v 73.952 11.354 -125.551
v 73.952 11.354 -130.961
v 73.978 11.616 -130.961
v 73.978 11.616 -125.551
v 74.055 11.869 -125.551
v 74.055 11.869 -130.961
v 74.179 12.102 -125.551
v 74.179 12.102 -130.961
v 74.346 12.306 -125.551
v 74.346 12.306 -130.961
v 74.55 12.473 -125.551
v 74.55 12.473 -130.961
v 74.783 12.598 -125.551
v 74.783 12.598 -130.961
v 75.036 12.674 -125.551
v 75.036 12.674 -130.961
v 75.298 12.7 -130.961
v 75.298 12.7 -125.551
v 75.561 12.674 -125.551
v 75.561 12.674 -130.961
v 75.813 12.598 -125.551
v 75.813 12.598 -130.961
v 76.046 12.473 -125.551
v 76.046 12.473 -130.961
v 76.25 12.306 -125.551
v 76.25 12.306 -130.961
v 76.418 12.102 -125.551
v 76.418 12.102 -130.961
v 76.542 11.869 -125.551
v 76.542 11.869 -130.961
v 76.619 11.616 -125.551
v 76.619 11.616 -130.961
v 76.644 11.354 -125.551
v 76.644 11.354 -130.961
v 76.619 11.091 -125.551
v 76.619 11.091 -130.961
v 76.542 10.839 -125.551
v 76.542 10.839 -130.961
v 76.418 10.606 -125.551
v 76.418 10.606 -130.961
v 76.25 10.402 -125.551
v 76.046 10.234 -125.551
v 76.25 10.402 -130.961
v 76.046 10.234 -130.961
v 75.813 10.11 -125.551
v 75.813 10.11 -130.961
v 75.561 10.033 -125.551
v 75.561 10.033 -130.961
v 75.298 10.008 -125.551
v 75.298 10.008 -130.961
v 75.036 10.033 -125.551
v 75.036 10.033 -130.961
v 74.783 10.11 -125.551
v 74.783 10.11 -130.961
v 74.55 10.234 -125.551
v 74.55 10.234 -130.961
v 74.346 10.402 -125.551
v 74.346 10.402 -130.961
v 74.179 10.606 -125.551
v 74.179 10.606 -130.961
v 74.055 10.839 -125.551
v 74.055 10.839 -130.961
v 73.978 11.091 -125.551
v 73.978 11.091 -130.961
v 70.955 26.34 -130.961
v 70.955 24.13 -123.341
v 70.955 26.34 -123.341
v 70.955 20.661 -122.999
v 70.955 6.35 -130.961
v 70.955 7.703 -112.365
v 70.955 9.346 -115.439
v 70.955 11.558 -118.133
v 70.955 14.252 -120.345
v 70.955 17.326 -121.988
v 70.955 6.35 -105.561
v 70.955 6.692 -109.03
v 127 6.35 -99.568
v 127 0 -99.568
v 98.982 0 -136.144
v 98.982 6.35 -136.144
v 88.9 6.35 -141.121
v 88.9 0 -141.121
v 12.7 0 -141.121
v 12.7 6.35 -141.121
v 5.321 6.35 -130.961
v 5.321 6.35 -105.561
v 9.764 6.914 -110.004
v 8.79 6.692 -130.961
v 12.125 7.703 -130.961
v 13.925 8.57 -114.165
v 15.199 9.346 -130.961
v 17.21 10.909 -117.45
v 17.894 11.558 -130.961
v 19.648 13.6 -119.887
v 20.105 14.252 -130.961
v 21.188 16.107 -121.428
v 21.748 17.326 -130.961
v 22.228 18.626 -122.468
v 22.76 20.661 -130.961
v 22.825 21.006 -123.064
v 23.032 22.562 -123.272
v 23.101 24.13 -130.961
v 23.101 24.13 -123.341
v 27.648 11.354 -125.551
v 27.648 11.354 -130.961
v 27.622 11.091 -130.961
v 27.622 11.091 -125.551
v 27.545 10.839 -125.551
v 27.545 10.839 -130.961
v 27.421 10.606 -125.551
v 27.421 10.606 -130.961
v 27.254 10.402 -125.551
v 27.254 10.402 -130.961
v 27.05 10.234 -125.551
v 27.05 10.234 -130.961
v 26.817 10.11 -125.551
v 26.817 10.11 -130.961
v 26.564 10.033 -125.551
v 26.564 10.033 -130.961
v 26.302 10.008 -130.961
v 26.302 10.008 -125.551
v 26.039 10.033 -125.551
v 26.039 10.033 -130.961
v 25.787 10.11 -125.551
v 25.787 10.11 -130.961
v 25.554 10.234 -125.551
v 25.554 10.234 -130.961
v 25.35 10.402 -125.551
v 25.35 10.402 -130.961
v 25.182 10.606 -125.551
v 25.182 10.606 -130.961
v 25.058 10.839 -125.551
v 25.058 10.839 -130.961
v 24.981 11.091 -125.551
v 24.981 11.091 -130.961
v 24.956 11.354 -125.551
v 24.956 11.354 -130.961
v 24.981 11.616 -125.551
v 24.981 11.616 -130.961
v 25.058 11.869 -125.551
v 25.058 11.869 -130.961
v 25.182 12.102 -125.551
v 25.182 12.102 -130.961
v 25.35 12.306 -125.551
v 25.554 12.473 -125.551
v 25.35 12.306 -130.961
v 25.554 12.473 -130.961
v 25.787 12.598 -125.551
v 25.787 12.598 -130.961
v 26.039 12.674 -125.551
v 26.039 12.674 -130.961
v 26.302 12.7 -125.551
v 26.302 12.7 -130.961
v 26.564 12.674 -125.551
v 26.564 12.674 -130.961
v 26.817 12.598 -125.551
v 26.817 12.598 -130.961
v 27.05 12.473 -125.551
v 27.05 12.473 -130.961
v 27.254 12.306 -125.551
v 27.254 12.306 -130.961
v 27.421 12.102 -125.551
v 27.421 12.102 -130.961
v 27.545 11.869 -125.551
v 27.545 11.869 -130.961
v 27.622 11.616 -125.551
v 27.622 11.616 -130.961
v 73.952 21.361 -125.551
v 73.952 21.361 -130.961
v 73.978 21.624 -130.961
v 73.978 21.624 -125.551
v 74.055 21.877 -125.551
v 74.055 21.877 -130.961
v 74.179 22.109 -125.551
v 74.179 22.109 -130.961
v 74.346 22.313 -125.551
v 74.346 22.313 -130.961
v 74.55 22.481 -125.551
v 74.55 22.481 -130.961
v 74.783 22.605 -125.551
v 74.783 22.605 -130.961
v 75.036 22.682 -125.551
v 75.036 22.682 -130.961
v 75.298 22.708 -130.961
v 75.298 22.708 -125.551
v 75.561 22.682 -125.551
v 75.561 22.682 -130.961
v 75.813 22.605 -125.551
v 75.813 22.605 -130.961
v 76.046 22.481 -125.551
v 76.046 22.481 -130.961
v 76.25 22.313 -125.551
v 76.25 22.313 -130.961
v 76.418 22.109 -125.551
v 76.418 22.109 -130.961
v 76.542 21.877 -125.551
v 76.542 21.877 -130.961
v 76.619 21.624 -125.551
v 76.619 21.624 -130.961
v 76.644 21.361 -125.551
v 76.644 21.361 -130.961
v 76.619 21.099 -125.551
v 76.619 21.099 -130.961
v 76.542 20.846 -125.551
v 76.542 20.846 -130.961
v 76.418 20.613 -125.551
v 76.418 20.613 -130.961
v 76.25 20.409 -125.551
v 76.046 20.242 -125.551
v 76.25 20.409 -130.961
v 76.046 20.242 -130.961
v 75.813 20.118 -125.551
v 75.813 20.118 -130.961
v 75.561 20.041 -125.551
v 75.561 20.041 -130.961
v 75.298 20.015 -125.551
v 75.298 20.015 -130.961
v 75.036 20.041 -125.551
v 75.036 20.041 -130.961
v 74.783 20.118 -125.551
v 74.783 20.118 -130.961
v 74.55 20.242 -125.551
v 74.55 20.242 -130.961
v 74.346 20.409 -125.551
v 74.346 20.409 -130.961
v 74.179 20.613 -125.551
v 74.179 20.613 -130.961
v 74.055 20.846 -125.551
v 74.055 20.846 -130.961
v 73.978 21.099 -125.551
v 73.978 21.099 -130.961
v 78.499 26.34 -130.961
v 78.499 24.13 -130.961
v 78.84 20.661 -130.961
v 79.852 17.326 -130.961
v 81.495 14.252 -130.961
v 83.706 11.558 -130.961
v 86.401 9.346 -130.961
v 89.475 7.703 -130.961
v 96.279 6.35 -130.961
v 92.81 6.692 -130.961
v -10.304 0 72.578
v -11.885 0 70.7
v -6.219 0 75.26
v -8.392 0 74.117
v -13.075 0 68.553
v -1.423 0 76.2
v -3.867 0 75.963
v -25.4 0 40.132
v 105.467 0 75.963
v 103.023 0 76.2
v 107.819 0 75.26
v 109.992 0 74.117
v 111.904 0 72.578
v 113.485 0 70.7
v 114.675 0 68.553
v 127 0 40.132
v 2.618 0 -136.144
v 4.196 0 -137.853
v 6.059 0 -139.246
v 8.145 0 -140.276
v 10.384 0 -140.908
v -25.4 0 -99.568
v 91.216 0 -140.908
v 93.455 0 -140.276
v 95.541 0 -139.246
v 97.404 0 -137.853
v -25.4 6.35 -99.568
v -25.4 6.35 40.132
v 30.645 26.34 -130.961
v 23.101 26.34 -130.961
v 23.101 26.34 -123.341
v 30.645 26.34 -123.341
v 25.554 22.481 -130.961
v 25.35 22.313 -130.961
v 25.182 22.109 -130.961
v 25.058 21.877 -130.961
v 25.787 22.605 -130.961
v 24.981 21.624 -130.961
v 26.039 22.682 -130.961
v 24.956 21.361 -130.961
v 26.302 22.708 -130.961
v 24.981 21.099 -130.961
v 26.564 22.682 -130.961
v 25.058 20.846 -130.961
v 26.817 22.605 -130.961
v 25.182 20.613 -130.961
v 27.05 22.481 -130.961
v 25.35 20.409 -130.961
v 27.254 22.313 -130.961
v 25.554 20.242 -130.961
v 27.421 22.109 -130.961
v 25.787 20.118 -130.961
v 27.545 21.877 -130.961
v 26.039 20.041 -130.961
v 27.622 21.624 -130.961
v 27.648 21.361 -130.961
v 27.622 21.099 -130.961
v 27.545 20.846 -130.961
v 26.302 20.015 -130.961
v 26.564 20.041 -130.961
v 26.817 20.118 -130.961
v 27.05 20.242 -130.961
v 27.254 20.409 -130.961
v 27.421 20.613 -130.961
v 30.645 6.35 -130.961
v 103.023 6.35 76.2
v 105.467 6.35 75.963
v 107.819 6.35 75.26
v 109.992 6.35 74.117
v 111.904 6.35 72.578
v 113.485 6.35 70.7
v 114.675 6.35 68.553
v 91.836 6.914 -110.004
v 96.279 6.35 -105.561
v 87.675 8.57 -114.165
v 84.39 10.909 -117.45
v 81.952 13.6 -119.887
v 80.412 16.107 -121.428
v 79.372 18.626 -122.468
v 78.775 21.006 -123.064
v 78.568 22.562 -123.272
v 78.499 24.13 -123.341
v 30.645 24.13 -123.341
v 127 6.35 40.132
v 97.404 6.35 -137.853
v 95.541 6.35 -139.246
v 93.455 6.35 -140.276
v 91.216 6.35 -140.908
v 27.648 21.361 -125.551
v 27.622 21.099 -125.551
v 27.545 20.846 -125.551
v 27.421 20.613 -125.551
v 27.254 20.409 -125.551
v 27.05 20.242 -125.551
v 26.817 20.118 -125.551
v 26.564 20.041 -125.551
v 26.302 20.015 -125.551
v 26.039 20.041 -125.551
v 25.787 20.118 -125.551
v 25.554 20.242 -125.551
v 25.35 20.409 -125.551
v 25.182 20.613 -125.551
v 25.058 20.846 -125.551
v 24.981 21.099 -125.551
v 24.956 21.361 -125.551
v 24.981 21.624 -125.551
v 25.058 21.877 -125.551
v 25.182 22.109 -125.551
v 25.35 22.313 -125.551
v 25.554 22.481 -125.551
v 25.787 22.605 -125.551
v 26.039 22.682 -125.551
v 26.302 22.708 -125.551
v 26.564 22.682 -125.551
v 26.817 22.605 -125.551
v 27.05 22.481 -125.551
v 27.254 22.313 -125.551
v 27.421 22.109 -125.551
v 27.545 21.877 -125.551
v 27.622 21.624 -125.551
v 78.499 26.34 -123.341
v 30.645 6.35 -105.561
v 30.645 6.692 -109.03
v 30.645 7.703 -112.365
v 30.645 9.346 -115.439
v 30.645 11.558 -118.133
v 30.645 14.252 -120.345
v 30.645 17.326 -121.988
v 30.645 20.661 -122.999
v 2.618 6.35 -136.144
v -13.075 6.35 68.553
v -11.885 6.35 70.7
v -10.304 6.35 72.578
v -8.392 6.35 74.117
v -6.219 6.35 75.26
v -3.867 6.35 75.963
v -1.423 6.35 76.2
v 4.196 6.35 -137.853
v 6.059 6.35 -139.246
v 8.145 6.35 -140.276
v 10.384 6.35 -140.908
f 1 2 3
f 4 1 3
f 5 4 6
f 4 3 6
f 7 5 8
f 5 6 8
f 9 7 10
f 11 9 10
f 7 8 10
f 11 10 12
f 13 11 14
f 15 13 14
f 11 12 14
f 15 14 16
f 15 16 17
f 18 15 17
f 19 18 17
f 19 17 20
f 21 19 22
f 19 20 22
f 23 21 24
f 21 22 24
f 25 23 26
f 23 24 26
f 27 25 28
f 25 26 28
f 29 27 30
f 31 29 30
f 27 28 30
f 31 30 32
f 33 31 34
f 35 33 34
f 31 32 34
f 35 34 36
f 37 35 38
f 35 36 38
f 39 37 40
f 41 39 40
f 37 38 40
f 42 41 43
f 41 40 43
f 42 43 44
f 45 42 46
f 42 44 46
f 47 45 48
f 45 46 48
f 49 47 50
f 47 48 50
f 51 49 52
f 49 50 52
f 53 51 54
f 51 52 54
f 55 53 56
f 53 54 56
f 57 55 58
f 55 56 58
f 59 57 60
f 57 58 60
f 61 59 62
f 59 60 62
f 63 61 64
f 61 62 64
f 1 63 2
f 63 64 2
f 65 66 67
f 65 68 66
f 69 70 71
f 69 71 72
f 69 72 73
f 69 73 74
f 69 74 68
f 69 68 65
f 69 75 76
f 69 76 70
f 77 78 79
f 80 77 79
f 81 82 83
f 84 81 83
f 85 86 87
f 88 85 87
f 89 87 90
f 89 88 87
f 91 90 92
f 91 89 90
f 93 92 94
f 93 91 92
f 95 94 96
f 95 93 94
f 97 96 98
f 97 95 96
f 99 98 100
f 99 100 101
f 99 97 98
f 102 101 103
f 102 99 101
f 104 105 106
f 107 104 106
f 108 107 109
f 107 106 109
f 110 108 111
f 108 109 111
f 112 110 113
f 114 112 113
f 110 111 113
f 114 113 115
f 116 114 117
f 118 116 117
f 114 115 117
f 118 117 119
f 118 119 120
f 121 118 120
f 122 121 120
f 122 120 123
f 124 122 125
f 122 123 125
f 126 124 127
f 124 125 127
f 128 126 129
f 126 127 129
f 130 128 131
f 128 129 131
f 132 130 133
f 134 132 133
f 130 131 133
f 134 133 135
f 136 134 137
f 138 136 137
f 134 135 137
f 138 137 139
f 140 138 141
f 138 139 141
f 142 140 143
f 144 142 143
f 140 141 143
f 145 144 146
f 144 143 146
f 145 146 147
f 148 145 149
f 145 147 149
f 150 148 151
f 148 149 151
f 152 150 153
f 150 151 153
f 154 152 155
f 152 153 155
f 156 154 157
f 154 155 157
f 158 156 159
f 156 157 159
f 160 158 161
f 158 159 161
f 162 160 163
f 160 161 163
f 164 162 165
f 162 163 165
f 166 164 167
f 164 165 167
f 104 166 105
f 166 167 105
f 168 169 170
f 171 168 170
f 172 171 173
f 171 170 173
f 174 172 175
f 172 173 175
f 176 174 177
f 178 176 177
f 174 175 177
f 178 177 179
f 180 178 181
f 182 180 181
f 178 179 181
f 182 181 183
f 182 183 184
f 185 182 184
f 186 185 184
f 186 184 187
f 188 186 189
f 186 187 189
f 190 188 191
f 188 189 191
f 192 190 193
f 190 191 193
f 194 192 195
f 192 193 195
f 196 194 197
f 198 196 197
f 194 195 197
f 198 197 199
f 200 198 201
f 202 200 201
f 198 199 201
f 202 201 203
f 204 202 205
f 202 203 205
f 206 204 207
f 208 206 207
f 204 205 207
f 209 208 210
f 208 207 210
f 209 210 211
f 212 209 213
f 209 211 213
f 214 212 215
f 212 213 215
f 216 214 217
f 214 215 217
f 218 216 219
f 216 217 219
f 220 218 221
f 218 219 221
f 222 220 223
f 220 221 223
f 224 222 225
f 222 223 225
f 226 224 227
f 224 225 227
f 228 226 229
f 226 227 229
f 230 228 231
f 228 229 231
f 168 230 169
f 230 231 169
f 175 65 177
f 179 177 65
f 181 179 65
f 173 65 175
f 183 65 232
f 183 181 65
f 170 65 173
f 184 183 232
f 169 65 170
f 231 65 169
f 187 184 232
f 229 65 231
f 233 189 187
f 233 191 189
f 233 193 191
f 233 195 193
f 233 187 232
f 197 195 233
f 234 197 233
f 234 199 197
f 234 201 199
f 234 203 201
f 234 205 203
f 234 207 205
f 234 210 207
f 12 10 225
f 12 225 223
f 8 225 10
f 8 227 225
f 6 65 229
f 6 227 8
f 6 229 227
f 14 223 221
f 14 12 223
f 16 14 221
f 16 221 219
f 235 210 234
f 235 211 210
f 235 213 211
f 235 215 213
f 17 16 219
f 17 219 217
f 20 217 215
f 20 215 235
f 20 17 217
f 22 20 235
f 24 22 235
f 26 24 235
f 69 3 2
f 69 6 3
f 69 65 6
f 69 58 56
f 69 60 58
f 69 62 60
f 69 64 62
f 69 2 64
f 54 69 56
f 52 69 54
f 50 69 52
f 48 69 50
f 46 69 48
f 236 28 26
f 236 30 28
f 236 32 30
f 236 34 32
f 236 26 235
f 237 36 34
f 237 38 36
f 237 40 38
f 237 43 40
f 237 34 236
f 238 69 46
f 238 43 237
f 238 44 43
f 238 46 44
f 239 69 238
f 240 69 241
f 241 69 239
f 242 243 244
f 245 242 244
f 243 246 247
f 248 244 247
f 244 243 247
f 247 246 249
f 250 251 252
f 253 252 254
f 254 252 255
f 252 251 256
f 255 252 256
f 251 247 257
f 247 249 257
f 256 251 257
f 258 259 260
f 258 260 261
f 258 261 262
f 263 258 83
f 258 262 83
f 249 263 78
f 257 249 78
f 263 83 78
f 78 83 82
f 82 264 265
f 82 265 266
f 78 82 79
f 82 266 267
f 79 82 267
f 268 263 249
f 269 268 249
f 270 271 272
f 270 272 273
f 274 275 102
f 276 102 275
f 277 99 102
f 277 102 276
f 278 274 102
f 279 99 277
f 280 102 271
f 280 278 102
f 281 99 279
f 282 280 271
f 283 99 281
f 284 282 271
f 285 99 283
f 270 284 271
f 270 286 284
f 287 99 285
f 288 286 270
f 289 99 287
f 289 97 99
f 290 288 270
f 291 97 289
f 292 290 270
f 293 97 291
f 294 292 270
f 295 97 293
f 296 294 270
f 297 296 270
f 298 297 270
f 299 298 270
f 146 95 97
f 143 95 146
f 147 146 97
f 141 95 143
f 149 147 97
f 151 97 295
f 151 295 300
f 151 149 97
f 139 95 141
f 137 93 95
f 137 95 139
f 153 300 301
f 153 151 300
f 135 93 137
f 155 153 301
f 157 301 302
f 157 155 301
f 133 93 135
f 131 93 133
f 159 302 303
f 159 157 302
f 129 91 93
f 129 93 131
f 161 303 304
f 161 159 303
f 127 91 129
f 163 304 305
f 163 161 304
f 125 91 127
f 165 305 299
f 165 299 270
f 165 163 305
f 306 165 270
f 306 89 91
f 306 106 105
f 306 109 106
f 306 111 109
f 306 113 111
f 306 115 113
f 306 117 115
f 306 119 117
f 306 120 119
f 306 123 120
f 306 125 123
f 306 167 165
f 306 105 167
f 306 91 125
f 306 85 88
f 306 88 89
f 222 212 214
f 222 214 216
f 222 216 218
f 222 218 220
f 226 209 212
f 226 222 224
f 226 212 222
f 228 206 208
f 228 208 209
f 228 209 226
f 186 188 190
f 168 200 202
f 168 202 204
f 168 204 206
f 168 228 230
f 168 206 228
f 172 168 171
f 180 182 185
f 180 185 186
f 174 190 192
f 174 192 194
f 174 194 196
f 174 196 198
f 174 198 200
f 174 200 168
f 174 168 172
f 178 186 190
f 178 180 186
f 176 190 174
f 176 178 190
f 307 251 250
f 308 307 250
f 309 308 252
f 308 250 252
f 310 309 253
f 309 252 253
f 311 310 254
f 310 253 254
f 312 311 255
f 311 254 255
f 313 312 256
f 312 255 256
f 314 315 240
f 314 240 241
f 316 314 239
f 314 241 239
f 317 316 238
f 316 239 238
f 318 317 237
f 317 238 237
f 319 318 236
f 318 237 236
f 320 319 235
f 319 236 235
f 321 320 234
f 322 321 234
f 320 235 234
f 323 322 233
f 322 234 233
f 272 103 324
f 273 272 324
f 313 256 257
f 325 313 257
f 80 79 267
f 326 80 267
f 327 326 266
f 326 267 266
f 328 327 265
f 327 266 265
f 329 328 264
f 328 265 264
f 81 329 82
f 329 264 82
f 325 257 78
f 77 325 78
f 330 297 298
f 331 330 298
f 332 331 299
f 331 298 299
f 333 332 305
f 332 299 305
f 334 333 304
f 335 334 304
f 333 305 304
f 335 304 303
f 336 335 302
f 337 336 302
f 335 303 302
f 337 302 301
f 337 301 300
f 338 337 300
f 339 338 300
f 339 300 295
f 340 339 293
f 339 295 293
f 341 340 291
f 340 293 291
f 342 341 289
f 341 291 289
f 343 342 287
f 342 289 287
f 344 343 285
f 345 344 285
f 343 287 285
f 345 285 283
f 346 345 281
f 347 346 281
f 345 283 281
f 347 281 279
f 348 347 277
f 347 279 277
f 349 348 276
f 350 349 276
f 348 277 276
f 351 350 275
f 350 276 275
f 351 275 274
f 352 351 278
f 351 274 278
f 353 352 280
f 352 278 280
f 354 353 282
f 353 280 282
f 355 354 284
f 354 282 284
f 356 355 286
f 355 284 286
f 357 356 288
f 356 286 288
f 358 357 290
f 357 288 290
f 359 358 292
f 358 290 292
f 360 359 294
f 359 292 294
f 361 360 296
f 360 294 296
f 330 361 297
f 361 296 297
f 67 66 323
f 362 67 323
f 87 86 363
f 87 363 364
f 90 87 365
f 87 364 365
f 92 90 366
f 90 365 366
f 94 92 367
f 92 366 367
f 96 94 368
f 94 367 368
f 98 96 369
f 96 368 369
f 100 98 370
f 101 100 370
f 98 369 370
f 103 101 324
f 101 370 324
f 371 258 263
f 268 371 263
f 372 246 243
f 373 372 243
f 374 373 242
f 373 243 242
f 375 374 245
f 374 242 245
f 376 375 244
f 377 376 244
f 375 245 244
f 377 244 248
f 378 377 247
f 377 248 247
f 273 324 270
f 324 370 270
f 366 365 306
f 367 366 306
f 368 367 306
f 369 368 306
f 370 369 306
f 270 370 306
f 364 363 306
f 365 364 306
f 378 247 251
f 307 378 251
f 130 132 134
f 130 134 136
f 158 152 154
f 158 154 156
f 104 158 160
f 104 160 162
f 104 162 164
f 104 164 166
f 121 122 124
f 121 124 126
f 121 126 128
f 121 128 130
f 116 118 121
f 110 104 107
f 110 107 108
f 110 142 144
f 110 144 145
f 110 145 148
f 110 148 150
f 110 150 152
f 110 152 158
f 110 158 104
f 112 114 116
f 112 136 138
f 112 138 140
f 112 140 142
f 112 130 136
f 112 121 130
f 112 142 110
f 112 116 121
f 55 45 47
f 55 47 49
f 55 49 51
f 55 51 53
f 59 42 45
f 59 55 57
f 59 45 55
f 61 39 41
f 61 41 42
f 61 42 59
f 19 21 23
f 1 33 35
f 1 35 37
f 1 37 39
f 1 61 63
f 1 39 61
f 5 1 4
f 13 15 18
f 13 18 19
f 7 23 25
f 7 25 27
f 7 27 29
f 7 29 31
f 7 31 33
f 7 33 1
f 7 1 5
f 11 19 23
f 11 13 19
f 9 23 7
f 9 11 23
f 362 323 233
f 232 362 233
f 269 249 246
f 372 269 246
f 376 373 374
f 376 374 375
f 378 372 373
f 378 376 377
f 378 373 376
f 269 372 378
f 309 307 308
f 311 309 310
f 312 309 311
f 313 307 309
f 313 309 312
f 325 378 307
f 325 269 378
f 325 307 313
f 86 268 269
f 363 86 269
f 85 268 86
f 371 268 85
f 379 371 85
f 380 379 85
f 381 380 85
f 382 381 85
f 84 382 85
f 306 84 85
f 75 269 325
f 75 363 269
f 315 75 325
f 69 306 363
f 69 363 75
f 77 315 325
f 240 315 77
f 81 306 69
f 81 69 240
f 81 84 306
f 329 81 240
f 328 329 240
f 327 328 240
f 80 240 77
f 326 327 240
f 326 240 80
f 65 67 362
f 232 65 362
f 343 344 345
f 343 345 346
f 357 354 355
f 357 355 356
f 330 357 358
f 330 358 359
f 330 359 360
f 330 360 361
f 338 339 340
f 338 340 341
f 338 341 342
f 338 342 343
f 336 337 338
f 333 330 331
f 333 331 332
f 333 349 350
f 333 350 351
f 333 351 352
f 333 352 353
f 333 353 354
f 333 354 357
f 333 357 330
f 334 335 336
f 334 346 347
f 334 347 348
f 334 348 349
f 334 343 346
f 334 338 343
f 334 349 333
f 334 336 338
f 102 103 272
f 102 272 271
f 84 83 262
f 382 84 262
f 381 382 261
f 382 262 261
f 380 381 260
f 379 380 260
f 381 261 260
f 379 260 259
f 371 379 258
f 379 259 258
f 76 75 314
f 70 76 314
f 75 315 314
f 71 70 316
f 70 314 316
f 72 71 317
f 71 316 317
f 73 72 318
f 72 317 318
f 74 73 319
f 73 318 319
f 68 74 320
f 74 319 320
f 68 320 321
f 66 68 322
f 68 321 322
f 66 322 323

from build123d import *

# Parameters (mm, degrees)
BOSS_EXTRUDE1_DEPTH = 6.35
SKETCH2_W           = 7.5438
SKETCH2_H           = 7.62
BOSS_EXTRUDE2_DEPTH = 19.9898
FILLET1_R           = 17.78
SKETCH3_R           = 1.3462
CUT_EXTRUDE1_DEPTH  = 5.4102


with BuildPart() as part:
    # Sketch1 → Boss-Extrude1 (new body)
    with BuildSketch(Plane(origin=(0, 0, 0), x_dir=(1, 0, 0), z_dir=(0, 1, 0))):
        with BuildLine():
            Line((88.9, 141.121005256), (50.8, 141.121005256))
            Line((50.8, 141.121005256), (50.8, -76.2))
            Line((50.8, -76.2), (103.023285942, -76.2))
            ThreePointArc((103.023285942, -76.2), (109.991730457, -74.117475267), (114.674827247, -68.552878903))
            Line((114.674827247, -68.552878903), (127, -40.132))
            Line((127, -40.132), (127, 99.568))
            Line((127, 99.568), (98.981931967, 136.144))
            ThreePointArc((98.981931967, 136.144), (94.521742023, 139.808982101), (88.9, 141.121005256))
        make_face()
        with BuildLine():
            Line((50.8, 141.121005256), (12.7, 141.121005256))
            ThreePointArc((12.7, 141.121005256), (7.078257977, 139.808982101), (2.618068033, 136.144))
            Line((2.618068033, 136.144), (-25.4, 99.568))
            Line((-25.4, 99.568), (-25.4, -40.132))
            Line((-25.4, -40.132), (-13.074827247, -68.552878903))
            ThreePointArc((-13.074827247, -68.552878903), (-8.391730457, -74.117475267), (-1.423285942, -76.2))
            Line((-1.423285942, -76.2), (50.8, -76.2))
            Line((50.8, -76.2), (50.8, 141.121005256))
        make_face()
    extrude(amount=BOSS_EXTRUDE1_DEPTH)

    # Sketch2 → Boss-Extrude2 (add)
    with BuildSketch(Plane(origin=(0, 6.35, 0), x_dir=(1, 0, 0), z_dir=(0, 1, 0))):
        with Locations((74.7268, 127.151005256)):
            Rectangle(SKETCH2_W, SKETCH2_H)
        with Locations((26.8732, 127.151005256)):
            Rectangle(SKETCH2_W, SKETCH2_H)
    extrude(amount=BOSS_EXTRUDE2_DEPTH)

    # Fillet1
    fillet1_edges = [part.edges().sort_by_distance(p)[0] for p in [
        (23.1013, 6.35, -127.151005256),
        (26.8732, 6.35, -123.341005256),
        (78.4987, 6.35, -127.151005256),
        (74.7268, 6.35, -123.341005256),
    ]]
    fillet(fillet1_edges, radius=FILLET1_R)

    # Sketch3 → Cut-Extrude1 (cut)
    with BuildSketch(Plane(origin=(0, 0, -130.961005256), x_dir=(-1, 0, 0), z_dir=(0, 0, -1))):
        with Locations((-75.2983, 11.3538)):
            Circle(SKETCH3_R)
        with Locations((-75.2983, 21.3614)):
            Circle(SKETCH3_R)
        with Locations(Location((-26.3017, 11.3538, 0), (0, 0, 180))):
            Circle(SKETCH3_R)
        with Locations(Location((-26.3017, 21.3614, 0), (0, 0, 180))):
            Circle(SKETCH3_R)
    extrude(amount=-CUT_EXTRUDE1_DEPTH, mode=Mode.SUBTRACT)


solid = part.part
